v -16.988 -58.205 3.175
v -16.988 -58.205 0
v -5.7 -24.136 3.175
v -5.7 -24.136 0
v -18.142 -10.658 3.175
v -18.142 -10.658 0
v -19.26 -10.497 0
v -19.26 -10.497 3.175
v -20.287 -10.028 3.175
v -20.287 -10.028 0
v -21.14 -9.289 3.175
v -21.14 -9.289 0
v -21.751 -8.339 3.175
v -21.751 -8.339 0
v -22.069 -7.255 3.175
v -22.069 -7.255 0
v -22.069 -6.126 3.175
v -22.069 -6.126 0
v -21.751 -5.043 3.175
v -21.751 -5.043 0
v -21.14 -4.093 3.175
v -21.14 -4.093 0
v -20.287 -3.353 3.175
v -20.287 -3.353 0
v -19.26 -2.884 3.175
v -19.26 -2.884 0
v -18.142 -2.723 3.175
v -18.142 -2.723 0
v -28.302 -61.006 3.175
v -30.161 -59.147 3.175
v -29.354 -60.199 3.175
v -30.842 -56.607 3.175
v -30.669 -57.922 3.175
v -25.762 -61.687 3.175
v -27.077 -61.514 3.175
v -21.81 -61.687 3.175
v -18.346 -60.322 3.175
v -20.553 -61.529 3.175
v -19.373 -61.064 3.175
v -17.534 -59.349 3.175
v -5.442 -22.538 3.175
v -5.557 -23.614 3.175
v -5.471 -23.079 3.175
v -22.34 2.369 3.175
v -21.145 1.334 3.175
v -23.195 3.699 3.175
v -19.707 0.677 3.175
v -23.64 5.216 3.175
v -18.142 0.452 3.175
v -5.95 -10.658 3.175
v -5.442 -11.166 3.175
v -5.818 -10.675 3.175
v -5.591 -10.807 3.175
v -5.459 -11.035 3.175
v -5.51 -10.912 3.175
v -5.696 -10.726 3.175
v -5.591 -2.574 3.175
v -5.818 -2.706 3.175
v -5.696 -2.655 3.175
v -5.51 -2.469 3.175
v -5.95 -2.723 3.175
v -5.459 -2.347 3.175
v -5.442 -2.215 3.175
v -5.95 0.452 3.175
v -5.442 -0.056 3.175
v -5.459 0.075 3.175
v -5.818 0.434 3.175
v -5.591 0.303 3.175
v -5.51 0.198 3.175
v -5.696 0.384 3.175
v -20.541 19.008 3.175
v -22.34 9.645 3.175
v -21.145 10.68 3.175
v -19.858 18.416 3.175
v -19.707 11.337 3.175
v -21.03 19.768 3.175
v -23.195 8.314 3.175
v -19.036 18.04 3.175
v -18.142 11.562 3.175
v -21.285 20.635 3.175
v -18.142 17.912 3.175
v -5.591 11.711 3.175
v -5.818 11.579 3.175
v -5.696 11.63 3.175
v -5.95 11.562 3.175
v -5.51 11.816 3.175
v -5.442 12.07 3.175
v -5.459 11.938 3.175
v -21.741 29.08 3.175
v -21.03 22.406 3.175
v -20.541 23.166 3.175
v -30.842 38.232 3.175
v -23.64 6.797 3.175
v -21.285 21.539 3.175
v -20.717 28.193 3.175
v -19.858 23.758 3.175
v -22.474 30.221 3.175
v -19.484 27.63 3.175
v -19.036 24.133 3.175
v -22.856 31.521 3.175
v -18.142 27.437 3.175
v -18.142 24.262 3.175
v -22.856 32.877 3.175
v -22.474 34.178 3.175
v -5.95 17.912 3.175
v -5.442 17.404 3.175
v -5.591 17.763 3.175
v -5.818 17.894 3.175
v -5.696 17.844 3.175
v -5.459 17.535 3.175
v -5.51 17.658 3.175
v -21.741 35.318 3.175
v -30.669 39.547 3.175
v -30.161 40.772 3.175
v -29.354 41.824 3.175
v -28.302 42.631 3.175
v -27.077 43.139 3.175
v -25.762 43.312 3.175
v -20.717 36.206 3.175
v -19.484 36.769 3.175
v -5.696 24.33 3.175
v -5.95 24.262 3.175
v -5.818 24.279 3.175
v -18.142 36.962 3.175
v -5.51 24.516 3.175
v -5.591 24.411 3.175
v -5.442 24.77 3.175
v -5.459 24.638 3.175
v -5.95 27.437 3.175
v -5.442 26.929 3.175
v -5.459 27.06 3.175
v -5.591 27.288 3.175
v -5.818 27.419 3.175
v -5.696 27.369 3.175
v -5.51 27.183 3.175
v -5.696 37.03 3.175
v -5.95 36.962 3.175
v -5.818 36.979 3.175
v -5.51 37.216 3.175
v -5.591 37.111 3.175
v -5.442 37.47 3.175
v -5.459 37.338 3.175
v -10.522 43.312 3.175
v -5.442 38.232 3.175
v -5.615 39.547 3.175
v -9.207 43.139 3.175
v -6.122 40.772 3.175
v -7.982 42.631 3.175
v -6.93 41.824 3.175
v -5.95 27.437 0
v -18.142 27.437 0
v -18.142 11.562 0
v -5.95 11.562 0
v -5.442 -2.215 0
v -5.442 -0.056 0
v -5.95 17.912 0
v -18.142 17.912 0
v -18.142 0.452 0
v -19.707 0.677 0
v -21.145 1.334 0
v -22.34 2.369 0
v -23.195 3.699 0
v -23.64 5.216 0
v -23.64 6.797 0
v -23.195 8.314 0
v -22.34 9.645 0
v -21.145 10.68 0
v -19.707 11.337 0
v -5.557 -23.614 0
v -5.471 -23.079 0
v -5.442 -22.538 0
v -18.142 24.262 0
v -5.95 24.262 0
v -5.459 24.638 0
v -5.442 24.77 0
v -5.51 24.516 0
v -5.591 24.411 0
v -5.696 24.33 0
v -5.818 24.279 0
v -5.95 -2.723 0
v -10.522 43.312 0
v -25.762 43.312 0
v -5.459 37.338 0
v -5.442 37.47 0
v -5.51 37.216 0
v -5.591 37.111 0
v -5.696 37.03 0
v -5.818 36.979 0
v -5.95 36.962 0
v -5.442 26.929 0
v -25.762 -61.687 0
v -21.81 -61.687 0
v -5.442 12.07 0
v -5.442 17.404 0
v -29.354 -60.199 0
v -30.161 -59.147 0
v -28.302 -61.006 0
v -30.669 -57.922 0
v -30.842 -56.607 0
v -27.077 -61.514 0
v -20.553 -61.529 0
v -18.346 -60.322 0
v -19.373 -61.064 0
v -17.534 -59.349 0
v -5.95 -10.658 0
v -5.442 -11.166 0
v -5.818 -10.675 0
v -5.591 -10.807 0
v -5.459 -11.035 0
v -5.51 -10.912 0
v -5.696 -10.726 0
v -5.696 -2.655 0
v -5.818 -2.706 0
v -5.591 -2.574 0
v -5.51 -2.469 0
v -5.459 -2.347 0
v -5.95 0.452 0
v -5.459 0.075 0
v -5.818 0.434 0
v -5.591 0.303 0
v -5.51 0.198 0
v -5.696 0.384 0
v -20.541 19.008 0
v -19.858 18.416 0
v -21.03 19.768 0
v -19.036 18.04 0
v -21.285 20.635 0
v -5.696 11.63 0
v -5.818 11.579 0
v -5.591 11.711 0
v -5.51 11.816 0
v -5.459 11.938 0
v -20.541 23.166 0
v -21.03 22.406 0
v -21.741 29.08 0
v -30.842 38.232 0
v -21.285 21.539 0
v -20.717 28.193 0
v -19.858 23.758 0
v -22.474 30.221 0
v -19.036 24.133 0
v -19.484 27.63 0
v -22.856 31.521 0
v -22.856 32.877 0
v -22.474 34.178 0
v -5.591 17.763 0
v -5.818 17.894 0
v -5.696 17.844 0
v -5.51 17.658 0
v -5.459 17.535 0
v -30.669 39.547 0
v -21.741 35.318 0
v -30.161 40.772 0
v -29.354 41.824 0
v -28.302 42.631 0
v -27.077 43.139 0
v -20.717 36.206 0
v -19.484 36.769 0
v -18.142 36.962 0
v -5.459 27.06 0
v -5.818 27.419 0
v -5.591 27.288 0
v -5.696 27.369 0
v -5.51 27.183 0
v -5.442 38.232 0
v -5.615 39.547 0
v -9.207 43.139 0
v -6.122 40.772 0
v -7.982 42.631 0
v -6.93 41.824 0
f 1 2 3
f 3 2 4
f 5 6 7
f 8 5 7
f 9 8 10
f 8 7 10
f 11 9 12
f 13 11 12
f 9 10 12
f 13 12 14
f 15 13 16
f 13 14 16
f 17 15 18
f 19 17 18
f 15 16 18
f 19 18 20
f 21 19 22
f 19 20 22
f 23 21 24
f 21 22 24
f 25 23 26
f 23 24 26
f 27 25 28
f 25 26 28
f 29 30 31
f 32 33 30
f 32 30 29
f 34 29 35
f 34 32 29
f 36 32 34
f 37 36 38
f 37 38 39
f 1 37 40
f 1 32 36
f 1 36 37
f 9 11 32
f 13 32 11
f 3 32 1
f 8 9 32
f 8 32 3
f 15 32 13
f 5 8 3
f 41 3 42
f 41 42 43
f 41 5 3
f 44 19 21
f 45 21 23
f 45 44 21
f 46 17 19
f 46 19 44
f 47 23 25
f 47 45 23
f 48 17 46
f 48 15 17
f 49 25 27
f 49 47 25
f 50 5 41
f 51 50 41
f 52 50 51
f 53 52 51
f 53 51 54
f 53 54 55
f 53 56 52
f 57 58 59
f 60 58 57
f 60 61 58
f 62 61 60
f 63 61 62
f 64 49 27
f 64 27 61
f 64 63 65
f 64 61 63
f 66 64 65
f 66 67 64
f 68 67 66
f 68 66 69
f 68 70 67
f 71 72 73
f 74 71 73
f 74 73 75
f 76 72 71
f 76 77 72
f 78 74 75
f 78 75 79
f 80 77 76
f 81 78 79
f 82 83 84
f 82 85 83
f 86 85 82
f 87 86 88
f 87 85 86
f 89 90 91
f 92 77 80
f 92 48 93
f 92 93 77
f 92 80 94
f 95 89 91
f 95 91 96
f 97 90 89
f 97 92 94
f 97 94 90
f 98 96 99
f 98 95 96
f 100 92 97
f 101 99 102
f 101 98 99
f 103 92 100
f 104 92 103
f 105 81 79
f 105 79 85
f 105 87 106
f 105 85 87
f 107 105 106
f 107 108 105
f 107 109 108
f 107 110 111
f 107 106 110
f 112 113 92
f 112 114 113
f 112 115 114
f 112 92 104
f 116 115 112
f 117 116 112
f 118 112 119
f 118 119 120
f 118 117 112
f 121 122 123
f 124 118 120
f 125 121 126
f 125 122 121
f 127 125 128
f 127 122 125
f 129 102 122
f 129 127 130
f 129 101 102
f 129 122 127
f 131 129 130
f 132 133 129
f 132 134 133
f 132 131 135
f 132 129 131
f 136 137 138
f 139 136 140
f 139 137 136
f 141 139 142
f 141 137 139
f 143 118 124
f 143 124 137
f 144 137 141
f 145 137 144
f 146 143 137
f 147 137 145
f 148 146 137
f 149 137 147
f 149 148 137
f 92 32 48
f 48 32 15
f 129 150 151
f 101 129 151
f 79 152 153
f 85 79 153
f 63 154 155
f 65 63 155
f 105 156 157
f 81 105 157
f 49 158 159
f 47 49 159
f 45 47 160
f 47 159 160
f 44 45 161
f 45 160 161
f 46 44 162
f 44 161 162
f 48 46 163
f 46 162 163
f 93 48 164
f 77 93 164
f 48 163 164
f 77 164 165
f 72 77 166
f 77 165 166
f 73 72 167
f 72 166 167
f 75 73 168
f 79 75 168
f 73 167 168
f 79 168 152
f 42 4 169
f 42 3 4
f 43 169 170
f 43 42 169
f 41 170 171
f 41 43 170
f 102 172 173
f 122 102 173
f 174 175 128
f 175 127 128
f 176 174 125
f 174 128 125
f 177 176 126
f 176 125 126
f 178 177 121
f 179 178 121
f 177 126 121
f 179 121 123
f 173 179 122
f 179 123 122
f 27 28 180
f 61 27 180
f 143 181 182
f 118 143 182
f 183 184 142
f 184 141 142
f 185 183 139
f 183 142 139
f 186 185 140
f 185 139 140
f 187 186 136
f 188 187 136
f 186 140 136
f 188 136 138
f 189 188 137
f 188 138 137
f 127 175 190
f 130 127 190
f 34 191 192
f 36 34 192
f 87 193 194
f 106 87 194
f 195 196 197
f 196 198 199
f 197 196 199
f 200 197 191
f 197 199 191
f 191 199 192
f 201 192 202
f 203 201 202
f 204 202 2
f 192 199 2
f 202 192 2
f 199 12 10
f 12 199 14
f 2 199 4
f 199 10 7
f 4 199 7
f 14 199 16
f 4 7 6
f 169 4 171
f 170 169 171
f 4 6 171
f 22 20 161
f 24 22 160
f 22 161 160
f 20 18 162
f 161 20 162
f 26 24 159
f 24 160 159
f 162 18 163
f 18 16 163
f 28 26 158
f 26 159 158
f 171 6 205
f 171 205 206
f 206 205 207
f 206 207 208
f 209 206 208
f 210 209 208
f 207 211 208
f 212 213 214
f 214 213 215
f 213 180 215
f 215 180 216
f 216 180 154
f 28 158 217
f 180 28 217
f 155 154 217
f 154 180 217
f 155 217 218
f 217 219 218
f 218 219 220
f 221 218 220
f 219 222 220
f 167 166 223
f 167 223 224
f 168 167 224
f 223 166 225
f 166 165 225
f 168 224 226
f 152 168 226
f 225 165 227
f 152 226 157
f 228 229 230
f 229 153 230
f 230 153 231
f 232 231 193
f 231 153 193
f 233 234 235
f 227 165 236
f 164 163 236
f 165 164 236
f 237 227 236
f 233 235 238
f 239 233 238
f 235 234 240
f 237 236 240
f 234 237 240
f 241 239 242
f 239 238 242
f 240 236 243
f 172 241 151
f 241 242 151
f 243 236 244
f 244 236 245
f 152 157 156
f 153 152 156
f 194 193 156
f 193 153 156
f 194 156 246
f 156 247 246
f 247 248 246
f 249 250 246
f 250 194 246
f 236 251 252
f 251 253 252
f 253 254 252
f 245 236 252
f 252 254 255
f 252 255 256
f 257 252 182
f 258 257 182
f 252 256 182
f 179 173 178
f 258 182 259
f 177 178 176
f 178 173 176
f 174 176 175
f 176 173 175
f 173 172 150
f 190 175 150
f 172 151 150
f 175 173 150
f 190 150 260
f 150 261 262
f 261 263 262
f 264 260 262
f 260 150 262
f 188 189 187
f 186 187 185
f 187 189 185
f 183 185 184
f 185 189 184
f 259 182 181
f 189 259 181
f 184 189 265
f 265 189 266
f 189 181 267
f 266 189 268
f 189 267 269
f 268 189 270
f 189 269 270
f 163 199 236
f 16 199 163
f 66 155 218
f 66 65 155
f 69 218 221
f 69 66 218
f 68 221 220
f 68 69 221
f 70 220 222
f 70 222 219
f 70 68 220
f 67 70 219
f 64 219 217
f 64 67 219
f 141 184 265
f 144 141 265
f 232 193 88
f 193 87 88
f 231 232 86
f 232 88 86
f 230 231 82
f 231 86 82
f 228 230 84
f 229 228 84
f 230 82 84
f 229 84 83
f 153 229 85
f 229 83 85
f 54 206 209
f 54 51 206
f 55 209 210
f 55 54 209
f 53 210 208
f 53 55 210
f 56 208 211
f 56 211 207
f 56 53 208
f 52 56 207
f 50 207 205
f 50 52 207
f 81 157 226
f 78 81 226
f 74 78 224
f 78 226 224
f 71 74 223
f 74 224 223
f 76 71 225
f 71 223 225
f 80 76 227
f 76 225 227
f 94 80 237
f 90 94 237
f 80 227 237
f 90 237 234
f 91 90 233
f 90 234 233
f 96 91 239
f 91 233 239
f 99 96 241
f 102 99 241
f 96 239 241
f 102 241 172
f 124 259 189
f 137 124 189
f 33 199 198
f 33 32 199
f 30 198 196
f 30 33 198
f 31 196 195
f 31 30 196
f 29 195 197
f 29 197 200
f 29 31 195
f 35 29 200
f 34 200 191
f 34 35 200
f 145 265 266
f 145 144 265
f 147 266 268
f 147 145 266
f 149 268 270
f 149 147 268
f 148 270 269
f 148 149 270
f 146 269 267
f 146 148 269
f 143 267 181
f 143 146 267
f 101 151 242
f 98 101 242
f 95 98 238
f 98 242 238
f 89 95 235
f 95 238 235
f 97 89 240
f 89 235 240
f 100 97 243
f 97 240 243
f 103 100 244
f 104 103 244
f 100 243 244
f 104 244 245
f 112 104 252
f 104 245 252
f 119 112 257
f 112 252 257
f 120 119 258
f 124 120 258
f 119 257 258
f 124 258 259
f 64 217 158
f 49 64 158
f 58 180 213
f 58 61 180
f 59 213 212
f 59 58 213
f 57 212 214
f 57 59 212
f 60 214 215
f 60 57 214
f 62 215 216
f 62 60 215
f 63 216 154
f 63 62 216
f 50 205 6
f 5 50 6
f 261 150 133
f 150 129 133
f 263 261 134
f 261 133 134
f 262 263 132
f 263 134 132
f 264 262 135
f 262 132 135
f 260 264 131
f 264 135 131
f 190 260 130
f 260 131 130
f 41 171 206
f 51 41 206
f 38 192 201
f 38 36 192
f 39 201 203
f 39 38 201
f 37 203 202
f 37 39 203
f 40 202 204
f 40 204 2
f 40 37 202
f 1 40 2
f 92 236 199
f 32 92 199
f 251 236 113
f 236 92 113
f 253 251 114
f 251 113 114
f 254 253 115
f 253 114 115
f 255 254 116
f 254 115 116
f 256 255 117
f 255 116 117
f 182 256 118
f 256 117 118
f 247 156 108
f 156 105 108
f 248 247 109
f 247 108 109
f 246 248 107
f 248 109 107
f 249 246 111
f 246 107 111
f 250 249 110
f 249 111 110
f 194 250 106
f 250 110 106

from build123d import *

# Parameters (mm, degrees)
F1_DEPTH = 3.175
F2_R     = 5.08
F3_R     = 0.508


with BuildPart() as f1:
    # F0 (on Top) → F1 (new body)
    with BuildSketch(Plane.XY):
        with BuildLine():
            Line((-30.841844, 43.311745), (-30.841844, -61.686775))
            Line((-30.841844, -61.686775), (-18.141844, -61.686775))
            Line((-18.141844, -61.686775), (-5.441844, -23.358175))
            Line((-5.441844, -23.358175), (-5.441844, -10.658175))
            Line((-5.441844, -10.658175), (-18.141844, -10.658175))
            ThreePointArc((-18.141844, -10.658175), (-22.109324, -6.690695), (-18.141844, -2.723215))
            Line((-18.141844, -2.723215), (-5.441844, -2.723215))
            Line((-5.441844, -2.723215), (-5.441844, 0.451785))
            Line((-5.441844, 0.451785), (-18.141844, 0.451785))
            ThreePointArc((-18.141844, 0.451785), (-23.696824, 6.006765), (-18.141844, 11.561745))
            Line((-18.141844, 11.561745), (-5.441844, 11.561745))
            Line((-5.441844, 11.561745), (-5.441844, 17.911745))
            Line((-5.441844, 17.911745), (-18.141844, 17.911745))
            ThreePointArc((-18.141844, 17.911745), (-21.316844, 21.086745), (-18.141844, 24.261745))
            Line((-18.141844, 24.261745), (-5.441844, 24.261745))
            Line((-5.441844, 24.261745), (-5.441844, 27.436745))
            Line((-5.441844, 27.436745), (-18.141844, 27.436745))
            ThreePointArc((-18.141844, 27.436745), (-22.904344, 32.199245), (-18.141844, 36.961745))
            Line((-18.141844, 36.961745), (-5.441844, 36.961745))
            Line((-5.441844, 36.961745), (-5.441844, 43.311745))
            Line((-5.441844, 43.311745), (-30.841844, 43.311745))
        make_face()
    extrude(amount=F1_DEPTH)

    # F2
    f2_edges = [f1.edges().sort_by_distance(p)[0] for p in [
        (-18.141844, -61.686775, 1.5875),
        (-5.441844, -23.358175, 1.5875),
        (-30.841844, -61.686775, 1.5875),
        (-5.441844, 43.311745, 1.5875),
        (-30.841844, 43.311745, 1.5875),
    ]]
    fillet(f2_edges, radius=F2_R)

    # F3
    f3_edges = [f1.edges().sort_by_distance(p)[0] for p in [
        (-5.441844, -10.658175, 1.5875),
        (-5.441844, -2.723215, 1.5875),
        (-5.441844, 0.451785, 1.5875),
        (-5.441844, 11.561745, 1.5875),
        (-5.441844, 17.911745, 1.5875),
        (-5.441844, 24.261745, 1.5875),
        (-5.441844, 27.436745, 1.5875),
        (-5.441844, 36.961745, 1.5875),
    ]]
    fillet(f3_edges, radius=F3_R)


solid = f1.part
